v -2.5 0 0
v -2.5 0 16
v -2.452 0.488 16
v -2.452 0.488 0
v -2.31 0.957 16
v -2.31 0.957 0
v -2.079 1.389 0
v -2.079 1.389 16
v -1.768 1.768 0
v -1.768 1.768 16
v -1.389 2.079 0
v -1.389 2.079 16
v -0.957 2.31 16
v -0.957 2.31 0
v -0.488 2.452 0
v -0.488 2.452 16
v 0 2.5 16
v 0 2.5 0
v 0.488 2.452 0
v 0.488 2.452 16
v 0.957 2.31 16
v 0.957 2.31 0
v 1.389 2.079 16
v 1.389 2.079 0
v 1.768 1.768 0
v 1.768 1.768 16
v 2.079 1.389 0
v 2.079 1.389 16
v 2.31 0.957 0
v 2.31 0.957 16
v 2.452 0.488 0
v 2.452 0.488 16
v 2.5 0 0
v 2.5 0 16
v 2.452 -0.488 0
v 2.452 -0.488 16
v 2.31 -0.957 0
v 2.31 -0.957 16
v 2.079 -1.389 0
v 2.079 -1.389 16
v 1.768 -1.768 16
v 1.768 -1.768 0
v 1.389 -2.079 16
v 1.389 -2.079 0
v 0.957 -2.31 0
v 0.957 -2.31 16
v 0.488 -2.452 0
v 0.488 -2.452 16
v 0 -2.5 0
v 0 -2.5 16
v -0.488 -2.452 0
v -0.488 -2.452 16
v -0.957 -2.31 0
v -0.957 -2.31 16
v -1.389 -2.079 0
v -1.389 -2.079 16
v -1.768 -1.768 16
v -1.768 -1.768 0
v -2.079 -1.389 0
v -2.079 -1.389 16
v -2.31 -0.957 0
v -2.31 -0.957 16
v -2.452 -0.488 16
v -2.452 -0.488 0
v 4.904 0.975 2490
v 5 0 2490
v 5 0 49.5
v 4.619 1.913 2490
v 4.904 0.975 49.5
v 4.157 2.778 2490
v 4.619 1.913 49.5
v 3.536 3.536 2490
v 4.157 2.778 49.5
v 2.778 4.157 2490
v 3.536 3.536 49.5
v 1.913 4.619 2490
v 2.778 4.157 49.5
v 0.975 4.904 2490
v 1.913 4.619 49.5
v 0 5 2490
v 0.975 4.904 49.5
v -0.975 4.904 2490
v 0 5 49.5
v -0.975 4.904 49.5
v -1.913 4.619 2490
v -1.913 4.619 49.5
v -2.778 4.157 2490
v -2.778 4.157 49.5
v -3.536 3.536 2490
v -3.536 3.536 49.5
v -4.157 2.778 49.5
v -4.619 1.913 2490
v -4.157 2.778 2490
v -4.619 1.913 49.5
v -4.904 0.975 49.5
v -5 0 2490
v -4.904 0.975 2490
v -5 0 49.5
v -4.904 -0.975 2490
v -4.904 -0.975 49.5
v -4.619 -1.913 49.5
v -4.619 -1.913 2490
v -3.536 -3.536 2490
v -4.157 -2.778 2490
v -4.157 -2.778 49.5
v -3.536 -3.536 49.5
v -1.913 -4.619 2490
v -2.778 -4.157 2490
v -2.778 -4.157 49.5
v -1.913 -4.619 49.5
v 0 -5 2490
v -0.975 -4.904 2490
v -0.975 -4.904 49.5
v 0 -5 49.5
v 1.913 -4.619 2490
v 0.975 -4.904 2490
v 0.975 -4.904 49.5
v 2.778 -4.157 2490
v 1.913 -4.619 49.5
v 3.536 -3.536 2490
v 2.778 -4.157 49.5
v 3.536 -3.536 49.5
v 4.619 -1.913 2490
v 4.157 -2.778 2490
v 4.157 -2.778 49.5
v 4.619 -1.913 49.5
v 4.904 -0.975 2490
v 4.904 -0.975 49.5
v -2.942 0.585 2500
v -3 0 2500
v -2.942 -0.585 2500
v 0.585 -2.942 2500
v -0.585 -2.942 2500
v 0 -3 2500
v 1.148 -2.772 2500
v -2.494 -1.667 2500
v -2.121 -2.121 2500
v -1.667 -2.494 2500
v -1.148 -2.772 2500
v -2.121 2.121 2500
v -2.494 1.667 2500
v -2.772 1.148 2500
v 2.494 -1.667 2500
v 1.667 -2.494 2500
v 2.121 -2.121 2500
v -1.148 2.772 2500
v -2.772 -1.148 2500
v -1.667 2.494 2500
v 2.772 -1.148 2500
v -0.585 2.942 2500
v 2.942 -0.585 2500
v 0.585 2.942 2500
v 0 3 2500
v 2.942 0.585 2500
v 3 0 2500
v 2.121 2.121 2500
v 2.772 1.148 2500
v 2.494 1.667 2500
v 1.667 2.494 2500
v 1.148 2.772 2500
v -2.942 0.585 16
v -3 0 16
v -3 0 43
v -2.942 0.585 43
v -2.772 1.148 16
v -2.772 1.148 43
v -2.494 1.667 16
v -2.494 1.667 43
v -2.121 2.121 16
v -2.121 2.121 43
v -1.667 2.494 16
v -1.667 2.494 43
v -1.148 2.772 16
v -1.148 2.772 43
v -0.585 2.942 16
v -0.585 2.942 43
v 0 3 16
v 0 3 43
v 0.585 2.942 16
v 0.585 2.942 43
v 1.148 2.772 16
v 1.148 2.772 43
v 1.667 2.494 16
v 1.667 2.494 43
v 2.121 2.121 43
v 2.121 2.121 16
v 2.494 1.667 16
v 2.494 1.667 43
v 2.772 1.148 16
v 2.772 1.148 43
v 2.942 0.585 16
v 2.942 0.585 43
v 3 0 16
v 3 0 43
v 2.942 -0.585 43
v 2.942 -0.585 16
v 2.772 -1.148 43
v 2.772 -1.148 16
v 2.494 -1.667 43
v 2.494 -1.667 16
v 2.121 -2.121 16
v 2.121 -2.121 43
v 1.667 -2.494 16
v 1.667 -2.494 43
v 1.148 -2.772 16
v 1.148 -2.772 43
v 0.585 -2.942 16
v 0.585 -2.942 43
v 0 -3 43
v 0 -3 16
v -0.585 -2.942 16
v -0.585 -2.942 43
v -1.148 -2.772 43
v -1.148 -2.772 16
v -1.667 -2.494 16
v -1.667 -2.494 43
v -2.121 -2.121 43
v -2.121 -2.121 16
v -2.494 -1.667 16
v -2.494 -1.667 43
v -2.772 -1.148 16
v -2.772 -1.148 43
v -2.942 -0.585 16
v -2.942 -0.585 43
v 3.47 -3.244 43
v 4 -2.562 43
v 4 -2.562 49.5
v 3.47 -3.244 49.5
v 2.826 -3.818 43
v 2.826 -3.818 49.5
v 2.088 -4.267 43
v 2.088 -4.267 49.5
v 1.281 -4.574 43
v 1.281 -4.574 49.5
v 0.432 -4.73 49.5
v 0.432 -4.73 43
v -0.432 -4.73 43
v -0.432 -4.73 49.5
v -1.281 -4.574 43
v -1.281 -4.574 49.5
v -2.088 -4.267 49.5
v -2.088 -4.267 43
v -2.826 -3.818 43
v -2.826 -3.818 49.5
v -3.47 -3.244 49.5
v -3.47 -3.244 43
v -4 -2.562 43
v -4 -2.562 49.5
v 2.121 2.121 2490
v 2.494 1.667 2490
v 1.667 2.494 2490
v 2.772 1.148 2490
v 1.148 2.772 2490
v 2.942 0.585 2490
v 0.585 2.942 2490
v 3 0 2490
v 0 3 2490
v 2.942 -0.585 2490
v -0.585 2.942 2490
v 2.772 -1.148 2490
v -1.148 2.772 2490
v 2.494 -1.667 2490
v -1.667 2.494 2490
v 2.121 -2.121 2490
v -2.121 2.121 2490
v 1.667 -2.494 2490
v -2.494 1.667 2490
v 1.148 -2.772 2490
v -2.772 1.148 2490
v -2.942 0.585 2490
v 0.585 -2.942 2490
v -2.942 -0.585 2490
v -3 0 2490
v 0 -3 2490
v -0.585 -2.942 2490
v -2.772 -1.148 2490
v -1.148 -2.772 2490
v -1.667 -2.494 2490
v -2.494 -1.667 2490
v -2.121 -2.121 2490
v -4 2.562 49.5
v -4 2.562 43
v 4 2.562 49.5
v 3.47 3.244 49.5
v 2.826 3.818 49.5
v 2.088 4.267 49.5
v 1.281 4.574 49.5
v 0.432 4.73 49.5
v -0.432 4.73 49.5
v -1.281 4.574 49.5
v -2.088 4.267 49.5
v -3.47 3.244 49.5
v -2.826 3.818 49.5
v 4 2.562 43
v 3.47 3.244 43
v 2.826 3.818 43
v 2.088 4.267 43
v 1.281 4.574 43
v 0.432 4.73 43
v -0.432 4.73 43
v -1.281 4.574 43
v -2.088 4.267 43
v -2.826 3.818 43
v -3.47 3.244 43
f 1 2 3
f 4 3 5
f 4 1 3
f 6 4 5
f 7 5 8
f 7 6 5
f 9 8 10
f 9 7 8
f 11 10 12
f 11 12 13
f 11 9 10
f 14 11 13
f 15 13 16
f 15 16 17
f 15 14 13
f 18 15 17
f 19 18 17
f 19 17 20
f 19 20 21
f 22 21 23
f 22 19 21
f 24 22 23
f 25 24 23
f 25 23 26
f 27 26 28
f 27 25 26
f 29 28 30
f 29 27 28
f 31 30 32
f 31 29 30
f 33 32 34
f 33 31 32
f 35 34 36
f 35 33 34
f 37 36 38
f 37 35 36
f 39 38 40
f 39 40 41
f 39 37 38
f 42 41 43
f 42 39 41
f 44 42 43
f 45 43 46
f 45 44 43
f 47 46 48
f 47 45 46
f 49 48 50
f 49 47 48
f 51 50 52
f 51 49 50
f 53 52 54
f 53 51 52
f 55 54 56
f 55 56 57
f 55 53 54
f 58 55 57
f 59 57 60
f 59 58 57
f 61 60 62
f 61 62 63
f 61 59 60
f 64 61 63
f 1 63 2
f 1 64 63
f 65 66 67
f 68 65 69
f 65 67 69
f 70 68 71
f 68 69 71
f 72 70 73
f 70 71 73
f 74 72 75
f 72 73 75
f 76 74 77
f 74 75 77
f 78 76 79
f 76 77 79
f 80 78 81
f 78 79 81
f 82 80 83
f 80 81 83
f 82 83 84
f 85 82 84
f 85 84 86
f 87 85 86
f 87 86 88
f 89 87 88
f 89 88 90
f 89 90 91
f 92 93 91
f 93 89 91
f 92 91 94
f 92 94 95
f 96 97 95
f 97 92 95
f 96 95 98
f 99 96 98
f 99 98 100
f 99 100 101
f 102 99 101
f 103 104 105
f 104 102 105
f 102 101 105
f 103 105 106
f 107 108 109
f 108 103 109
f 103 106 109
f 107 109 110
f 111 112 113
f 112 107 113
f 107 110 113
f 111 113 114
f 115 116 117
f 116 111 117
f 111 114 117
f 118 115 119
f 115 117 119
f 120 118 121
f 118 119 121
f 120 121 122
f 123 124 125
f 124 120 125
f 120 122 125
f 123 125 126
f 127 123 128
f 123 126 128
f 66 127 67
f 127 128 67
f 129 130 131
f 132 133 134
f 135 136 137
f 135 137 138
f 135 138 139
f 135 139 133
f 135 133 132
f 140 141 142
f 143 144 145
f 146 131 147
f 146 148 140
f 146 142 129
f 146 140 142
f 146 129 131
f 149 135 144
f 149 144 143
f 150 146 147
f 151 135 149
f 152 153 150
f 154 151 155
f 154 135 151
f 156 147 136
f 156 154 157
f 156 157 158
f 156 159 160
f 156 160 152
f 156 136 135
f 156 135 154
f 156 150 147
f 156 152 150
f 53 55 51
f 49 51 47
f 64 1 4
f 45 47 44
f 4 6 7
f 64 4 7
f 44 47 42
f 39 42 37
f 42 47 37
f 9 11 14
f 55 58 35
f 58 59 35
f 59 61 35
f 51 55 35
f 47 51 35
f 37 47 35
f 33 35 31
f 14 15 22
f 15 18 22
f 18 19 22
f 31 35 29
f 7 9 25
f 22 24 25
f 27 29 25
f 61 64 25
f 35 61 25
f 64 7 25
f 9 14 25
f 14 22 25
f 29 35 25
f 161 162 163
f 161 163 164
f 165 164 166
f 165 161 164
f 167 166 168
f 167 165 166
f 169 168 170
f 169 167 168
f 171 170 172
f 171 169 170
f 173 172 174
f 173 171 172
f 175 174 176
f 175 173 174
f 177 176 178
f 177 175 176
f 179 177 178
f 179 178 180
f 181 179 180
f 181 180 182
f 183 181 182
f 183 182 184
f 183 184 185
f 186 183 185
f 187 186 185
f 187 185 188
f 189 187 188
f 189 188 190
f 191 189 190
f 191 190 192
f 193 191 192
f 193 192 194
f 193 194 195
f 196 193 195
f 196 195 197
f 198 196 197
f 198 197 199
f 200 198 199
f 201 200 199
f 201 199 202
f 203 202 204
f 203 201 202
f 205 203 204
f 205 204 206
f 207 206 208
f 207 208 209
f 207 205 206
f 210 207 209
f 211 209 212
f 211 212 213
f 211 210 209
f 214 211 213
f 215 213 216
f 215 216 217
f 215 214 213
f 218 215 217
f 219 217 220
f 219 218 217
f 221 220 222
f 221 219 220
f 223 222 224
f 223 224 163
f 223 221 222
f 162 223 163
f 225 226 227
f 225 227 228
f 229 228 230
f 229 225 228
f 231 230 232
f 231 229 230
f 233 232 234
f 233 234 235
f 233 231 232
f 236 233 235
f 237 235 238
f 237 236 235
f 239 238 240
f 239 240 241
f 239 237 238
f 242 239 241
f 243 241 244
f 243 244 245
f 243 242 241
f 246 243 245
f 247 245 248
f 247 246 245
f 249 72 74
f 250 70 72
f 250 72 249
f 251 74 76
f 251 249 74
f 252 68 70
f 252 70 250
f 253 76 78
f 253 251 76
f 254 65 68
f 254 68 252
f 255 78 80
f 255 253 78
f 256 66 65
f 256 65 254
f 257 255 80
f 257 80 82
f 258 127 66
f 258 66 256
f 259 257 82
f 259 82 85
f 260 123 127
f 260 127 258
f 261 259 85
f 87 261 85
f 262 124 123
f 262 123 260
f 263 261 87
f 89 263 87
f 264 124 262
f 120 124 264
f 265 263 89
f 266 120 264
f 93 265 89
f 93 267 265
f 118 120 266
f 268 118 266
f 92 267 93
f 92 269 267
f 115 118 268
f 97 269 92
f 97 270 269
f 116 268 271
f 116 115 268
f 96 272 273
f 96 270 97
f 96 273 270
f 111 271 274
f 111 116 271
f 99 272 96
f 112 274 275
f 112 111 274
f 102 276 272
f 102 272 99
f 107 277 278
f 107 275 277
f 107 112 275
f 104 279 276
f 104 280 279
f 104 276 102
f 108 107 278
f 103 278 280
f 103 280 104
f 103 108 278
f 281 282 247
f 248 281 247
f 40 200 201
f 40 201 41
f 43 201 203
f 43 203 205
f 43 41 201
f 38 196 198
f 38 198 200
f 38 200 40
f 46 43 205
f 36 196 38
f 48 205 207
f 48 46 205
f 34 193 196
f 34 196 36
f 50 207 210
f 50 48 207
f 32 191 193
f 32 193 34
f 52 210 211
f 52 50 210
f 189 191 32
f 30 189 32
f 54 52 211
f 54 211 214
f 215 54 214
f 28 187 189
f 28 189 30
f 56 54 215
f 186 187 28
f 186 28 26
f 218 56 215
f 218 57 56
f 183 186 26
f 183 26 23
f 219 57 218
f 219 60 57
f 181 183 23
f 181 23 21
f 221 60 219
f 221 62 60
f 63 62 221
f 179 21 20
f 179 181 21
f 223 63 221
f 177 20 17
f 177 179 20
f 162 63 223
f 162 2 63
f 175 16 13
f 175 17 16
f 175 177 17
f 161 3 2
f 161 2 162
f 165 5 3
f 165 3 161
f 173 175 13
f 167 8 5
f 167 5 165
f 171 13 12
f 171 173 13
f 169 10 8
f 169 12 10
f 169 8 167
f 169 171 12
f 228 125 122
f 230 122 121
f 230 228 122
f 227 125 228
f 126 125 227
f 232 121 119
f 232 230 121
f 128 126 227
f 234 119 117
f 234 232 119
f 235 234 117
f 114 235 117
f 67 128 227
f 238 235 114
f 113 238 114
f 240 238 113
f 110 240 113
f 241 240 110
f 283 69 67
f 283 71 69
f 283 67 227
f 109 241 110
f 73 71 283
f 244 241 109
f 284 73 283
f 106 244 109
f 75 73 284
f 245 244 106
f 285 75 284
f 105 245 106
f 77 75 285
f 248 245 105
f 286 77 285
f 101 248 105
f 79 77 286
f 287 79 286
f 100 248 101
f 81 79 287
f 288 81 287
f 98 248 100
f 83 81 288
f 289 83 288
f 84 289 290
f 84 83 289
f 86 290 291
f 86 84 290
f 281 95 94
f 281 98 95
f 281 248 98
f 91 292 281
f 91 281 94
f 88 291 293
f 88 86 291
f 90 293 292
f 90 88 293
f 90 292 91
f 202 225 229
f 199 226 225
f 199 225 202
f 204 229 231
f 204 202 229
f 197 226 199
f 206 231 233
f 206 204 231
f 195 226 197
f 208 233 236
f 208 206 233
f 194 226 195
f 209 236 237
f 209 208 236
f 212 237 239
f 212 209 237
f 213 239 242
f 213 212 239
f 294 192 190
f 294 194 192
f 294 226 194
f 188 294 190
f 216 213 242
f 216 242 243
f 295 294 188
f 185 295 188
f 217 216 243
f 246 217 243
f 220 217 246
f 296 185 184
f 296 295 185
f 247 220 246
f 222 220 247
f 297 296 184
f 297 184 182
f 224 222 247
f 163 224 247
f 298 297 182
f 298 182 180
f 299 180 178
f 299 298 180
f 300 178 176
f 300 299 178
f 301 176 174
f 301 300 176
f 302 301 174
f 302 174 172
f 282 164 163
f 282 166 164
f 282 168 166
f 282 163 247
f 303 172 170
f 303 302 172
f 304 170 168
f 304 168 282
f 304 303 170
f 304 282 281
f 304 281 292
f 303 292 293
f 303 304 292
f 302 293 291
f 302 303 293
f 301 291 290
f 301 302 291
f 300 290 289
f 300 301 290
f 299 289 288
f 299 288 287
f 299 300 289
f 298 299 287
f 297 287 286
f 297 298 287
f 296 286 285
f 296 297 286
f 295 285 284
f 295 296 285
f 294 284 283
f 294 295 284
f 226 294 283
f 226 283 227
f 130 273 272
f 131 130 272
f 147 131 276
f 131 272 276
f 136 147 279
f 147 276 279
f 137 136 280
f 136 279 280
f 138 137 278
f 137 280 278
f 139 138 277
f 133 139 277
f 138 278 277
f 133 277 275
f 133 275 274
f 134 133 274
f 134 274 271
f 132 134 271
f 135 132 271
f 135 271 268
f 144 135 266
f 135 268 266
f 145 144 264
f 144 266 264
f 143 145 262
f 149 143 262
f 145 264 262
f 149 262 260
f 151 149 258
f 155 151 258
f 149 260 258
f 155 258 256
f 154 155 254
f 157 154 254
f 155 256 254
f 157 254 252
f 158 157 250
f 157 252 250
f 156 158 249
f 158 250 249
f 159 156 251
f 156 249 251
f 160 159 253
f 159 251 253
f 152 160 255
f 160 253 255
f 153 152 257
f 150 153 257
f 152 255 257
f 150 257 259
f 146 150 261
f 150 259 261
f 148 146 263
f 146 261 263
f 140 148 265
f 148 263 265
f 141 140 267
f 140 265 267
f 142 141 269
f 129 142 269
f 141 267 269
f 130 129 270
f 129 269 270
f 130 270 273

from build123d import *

# Parameters (mm, degrees)
SKETCH1_R           = 5
BOSS_EXTRUDE1_DEPTH = 2500
SKETCH2_R           = 5
SKETCH2_R_2         = 4.75
CUT_EXTRUDE1_DEPTH  = 49.5
SKETCH3_R           = 4.75
SKETCH3_R_2         = 3
CUT_EXTRUDE2_DEPTH  = 43
CUT_EXTRUDE3_DEPTH  = 6.5
SKETCH6_R           = 3
SKETCH6_R_2         = 2.5
CUT_EXTRUDE4_DEPTH  = 16
CUT_EXTRUDE5_START  = -10
SKETCH7_R           = 5
SKETCH7_R_2         = 3
CUT_EXTRUDE5_DEPTH  = 10


with BuildPart() as part:
    # Sketch1 → Boss-Extrude1 (new body)
    with BuildSketch(Plane.XY):
        Circle(SKETCH1_R)
    extrude(amount=BOSS_EXTRUDE1_DEPTH)

    # Sketch2 → Cut-Extrude1 (cut)
    with BuildSketch(Plane(origin=(0, 0, 0), x_dir=(-1, 0, 0), z_dir=(0, 0, -1))):
        Circle(SKETCH2_R)
        Circle(SKETCH2_R_2, mode=Mode.SUBTRACT)
    extrude(amount=-CUT_EXTRUDE1_DEPTH, mode=Mode.SUBTRACT)

    # Sketch3 → Cut-Extrude2 (cut)
    with BuildSketch(Plane(origin=(0, 0, 0), x_dir=(-1, 0, 0), z_dir=(0, 0, -1))):
        Circle(SKETCH3_R)
        Circle(SKETCH3_R_2, mode=Mode.SUBTRACT)
    extrude(amount=-CUT_EXTRUDE2_DEPTH, mode=Mode.SUBTRACT)

    # Sketch5 → Cut-Extrude3 (cut)
    with BuildSketch(Plane(origin=(0, 0, 43), x_dir=(-1, 0, 0), z_dir=(0, 0, -1))):
        with BuildLine():
            Line((-4, 2.561737691), (-4, -2.561737691))
            ThreePointArc((-4, -2.561737691), (-4.75, 0), (-4, 2.561737691))
        make_face()
        with BuildLine():
            Line((4, 2.561737691), (4, -2.561737691))
            ThreePointArc((4, -2.561737691), (4.75, 0), (4, 2.561737691))
        make_face()
    extrude(amount=-CUT_EXTRUDE3_DEPTH, mode=Mode.SUBTRACT)

    # Sketch6 → Cut-Extrude4 (cut)
    with BuildSketch(Plane(origin=(0, 0, 0), x_dir=(-1, 0, 0), z_dir=(0, 0, -1))):
        Circle(SKETCH6_R)
        Circle(SKETCH6_R_2, mode=Mode.SUBTRACT)
    extrude(amount=-CUT_EXTRUDE4_DEPTH, mode=Mode.SUBTRACT)

    # Sketch7 → Cut-Extrude5 (cut)
    with BuildSketch(Plane.XY.offset(2500).offset(CUT_EXTRUDE5_START)):
        with Locations(Location((0, 0, 0), (0, 0, 180))):
            Circle(SKETCH7_R)
        with Locations(Location((0, 0, 0), (0, 0, 180))):
            Circle(SKETCH7_R_2, mode=Mode.SUBTRACT)
    extrude(amount=CUT_EXTRUDE5_DEPTH, mode=Mode.SUBTRACT)


solid = part.part
